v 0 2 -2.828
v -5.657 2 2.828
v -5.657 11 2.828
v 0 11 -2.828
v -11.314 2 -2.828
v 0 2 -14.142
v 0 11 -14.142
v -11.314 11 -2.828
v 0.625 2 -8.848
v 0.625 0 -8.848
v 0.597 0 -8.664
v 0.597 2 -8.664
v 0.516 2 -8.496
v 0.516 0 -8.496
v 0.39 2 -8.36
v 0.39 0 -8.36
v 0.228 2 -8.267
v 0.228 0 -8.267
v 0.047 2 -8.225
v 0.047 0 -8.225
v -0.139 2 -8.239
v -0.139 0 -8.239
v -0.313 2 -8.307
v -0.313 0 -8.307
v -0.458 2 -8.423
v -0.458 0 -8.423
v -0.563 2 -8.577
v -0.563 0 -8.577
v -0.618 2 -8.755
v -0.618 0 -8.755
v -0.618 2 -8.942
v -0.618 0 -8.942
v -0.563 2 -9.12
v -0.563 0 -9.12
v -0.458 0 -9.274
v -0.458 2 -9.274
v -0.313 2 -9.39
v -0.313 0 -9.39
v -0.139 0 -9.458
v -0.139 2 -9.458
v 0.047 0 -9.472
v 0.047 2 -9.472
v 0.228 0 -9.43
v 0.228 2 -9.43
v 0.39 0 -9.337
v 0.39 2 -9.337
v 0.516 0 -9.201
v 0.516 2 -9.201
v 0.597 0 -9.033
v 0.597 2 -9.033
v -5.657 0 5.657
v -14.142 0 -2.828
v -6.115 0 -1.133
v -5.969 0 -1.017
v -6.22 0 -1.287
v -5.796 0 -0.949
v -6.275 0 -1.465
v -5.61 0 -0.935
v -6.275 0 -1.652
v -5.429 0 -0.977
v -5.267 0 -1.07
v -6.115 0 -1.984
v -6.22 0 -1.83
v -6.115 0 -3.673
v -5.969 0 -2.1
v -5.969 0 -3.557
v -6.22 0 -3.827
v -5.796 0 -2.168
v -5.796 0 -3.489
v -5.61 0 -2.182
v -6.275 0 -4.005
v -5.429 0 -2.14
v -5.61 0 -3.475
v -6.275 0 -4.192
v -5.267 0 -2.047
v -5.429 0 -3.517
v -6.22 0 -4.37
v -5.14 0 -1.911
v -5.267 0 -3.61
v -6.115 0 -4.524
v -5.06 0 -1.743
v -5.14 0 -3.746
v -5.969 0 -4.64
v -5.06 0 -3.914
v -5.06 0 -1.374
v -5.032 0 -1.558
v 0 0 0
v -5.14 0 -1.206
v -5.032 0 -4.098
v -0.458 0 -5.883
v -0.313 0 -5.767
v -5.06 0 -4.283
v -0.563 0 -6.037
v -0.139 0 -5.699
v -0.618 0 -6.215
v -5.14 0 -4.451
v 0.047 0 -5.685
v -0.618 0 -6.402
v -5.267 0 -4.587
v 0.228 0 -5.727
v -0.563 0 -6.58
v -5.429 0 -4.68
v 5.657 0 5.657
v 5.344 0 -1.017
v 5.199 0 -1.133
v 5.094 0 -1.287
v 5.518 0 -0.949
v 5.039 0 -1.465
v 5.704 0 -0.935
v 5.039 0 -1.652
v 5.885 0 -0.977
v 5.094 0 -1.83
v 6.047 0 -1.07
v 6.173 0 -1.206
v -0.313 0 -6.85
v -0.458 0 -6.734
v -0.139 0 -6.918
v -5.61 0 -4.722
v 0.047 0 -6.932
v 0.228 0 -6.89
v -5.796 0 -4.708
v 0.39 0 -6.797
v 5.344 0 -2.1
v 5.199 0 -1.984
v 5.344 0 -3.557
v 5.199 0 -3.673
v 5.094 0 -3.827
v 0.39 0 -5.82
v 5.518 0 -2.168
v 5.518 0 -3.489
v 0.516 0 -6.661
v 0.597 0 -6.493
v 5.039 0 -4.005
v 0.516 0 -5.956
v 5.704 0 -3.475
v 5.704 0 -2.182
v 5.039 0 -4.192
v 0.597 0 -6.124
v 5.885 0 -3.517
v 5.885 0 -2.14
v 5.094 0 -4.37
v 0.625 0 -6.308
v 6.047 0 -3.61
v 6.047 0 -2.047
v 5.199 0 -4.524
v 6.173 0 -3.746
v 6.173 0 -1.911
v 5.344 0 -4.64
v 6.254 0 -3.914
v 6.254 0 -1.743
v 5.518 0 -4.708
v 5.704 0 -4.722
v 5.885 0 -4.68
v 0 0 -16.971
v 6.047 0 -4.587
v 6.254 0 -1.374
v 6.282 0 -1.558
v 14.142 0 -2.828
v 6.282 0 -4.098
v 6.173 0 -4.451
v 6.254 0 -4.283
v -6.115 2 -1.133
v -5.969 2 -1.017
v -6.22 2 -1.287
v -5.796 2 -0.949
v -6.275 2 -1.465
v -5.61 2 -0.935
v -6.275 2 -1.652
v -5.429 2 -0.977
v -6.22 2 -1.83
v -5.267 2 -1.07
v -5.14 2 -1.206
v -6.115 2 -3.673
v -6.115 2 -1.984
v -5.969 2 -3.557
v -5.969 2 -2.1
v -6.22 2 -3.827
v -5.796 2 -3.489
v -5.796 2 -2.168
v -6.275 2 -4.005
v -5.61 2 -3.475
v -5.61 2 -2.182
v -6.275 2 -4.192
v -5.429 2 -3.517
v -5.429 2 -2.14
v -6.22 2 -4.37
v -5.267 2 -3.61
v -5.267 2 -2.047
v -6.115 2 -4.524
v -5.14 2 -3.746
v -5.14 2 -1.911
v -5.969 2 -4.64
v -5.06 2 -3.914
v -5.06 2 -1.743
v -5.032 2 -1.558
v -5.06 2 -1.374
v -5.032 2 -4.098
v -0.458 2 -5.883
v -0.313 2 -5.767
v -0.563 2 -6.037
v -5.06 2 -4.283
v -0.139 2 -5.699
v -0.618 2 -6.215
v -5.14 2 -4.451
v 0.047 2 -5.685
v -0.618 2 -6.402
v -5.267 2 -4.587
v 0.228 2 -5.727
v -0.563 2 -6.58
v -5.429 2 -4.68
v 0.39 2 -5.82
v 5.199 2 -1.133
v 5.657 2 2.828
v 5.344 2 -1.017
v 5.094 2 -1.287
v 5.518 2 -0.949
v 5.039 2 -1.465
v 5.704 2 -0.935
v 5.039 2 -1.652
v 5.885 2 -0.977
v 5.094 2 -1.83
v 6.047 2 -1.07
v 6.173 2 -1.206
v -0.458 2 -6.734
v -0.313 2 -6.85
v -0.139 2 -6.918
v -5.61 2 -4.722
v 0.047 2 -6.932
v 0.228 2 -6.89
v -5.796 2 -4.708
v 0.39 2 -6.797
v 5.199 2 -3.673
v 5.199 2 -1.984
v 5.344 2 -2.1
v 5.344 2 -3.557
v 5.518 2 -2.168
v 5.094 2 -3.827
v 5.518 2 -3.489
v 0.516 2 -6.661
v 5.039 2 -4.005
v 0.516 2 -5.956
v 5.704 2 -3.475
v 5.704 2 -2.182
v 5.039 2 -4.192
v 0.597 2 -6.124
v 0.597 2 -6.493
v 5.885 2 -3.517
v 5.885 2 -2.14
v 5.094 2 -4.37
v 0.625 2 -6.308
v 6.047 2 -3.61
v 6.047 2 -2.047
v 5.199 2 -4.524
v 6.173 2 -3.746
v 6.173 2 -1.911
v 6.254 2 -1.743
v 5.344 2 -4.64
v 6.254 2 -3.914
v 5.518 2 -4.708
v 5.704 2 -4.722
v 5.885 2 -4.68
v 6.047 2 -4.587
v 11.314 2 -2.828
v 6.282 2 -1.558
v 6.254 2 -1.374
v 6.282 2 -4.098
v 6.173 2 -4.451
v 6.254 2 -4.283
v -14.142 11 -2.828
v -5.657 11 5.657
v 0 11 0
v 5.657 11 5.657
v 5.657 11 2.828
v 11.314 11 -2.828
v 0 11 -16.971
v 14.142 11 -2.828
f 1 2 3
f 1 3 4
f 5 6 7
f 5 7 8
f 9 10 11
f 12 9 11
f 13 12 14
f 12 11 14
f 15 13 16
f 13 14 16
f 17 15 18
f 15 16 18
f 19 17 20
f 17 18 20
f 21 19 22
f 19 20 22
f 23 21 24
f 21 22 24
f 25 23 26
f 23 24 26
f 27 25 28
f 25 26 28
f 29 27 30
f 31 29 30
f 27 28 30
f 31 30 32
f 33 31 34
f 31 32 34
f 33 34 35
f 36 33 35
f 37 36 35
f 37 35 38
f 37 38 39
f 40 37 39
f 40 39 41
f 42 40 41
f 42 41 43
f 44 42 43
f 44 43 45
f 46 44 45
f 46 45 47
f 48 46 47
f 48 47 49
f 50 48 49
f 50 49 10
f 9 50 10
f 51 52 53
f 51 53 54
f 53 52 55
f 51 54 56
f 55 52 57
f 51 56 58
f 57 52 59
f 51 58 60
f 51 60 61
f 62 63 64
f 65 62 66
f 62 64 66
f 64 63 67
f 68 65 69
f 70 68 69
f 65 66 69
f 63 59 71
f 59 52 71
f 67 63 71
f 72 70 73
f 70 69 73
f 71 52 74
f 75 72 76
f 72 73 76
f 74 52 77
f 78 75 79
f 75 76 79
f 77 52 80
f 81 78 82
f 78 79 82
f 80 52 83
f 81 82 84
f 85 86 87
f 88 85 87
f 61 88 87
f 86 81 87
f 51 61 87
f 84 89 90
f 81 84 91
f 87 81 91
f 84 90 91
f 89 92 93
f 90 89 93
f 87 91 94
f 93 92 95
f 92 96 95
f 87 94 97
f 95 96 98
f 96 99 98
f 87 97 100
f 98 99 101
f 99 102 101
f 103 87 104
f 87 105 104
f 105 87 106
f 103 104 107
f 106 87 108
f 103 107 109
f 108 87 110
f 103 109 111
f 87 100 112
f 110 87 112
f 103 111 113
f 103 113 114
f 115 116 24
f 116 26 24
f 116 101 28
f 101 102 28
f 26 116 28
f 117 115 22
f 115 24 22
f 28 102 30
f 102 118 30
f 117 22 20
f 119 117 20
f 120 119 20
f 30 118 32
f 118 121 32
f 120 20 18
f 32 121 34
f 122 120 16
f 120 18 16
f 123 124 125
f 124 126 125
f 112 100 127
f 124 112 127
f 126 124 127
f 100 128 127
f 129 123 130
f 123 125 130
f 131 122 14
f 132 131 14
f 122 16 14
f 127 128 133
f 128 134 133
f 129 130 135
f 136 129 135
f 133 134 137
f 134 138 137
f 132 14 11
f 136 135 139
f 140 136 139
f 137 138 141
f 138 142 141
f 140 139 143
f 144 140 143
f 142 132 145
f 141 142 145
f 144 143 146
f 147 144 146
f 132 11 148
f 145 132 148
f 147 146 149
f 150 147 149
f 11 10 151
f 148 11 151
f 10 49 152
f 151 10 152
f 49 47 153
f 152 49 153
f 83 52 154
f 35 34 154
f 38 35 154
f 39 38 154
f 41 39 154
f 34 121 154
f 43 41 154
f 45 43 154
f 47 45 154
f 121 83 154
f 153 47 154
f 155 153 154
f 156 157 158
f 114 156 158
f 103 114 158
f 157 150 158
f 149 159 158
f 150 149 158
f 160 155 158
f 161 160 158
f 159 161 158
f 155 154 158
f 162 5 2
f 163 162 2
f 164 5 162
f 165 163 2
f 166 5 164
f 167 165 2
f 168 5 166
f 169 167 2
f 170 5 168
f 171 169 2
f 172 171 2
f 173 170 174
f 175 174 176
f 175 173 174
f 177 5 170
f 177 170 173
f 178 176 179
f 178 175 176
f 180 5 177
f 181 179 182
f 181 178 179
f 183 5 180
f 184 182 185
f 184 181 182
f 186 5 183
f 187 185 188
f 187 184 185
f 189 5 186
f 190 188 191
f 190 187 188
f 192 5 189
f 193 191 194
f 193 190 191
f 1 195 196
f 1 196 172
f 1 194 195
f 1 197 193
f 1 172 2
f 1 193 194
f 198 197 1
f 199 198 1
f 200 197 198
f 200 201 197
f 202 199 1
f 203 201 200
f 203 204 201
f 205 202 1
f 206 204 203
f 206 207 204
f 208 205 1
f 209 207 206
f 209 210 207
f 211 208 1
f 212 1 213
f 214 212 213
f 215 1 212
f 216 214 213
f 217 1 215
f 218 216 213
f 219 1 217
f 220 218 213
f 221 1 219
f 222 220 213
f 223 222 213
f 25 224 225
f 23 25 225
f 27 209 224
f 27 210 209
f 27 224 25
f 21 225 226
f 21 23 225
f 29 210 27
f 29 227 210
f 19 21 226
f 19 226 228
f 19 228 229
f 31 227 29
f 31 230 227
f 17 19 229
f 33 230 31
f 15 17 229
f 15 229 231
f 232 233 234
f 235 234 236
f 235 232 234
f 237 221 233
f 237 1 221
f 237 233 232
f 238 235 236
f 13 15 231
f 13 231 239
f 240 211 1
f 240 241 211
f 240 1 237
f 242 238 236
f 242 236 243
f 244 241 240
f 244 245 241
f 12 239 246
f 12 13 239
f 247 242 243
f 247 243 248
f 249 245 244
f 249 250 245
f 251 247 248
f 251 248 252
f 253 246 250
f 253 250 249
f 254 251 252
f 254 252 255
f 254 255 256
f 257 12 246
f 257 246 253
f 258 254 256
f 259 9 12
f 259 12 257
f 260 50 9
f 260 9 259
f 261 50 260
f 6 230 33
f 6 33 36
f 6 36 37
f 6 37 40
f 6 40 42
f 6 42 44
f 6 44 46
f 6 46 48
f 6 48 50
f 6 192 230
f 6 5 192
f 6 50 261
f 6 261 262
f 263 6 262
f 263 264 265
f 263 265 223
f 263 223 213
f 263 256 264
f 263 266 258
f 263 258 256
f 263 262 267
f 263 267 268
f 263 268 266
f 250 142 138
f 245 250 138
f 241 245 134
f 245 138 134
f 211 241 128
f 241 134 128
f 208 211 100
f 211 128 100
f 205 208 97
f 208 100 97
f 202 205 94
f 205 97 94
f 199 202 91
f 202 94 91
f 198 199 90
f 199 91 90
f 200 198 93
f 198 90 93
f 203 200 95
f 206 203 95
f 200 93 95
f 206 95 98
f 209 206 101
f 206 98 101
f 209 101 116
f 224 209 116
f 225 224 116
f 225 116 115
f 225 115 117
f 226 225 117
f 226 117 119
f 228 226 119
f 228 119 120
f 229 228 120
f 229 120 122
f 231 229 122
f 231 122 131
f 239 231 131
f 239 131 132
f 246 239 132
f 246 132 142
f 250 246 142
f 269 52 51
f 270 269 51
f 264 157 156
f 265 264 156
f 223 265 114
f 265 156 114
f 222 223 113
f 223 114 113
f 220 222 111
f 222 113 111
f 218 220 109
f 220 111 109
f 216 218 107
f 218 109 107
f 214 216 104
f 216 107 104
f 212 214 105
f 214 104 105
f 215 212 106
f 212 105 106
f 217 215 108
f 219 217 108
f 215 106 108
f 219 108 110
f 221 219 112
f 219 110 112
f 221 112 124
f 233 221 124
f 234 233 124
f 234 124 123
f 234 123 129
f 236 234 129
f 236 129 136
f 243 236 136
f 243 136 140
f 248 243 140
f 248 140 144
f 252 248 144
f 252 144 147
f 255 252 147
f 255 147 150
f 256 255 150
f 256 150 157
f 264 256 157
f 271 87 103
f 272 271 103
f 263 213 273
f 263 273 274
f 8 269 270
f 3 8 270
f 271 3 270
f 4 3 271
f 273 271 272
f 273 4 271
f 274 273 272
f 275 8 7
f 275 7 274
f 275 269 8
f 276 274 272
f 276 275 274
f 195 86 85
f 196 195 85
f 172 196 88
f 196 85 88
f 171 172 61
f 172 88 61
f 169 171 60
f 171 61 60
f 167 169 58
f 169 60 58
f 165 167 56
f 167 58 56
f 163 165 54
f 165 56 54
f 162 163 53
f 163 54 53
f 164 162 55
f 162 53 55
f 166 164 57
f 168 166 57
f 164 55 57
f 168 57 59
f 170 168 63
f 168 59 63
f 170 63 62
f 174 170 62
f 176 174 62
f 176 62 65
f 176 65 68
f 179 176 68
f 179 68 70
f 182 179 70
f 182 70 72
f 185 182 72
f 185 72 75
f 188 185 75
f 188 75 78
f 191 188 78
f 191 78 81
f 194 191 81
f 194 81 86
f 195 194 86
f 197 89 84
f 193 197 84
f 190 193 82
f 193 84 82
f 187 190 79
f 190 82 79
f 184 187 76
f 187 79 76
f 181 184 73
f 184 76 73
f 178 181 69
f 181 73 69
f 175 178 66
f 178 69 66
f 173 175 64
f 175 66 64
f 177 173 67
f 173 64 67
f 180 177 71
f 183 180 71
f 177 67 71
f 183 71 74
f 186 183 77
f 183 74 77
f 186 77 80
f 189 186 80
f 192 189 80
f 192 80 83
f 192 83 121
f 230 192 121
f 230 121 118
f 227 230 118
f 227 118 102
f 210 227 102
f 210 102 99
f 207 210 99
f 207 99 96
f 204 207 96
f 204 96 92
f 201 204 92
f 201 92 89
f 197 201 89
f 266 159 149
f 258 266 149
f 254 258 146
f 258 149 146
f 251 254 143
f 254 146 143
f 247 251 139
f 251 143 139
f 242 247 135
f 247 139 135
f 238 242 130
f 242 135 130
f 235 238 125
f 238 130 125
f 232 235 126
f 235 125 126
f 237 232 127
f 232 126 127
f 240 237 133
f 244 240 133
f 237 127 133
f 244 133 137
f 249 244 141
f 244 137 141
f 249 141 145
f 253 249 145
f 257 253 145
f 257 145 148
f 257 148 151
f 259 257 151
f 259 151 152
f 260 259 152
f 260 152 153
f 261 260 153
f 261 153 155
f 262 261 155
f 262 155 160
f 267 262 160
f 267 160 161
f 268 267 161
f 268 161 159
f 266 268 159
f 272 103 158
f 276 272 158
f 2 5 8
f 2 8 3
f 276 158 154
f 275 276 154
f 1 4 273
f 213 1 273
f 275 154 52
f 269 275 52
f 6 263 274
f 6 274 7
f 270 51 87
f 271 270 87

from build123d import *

# Parameters (mm, degrees)
BOSS_EXTRUDE1_DEPTH = 11
SHELL1_T            = -2
SKETCH3_R           = 0.625
CUT_EXTRUDE1_DEPTH  = 10


with BuildPart() as part:
    # Sketch1 → Boss-Extrude1 (new body)
    with BuildSketch(Plane(origin=(0, 0, 0), x_dir=(1, 0, 0), z_dir=(0, 1, 0))):
        Polygon((0, 0), (5.656854249, -5.656854249), (14.142135624, 2.828427125), (0, 16.970562748), (-14.142135624, 2.828427125), (-5.656854249, -5.656854249), align=None)
    extrude(amount=BOSS_EXTRUDE1_DEPTH)

    # Shell1
    shell1_openings = [part.faces().sort_by_distance(p)[0] for p in [
        (0, 11, -1.885618083),
    ]]
    offset(amount=SHELL1_T, openings=shell1_openings, kind=Kind.INTERSECTION)

    # Sketch3 → Cut-Extrude1 (cut)
    with BuildSketch(Plane.XZ):
        with Locations((-5.656854249, -1.558427125)):
            Circle(SKETCH3_R)
        with Locations((-5.656854249, -4.098427125)):
            Circle(SKETCH3_R)
        with Locations((0, -6.308427125)):
            Circle(SKETCH3_R)
        with Locations((0, -8.848427125)):
            Circle(SKETCH3_R)
        with Locations((5.656854249, -1.558427125)):
            Circle(SKETCH3_R)
        with Locations((5.656854249, -4.098427125)):
            Circle(SKETCH3_R)
    extrude(amount=-CUT_EXTRUDE1_DEPTH, mode=Mode.SUBTRACT)


solid = part.part
